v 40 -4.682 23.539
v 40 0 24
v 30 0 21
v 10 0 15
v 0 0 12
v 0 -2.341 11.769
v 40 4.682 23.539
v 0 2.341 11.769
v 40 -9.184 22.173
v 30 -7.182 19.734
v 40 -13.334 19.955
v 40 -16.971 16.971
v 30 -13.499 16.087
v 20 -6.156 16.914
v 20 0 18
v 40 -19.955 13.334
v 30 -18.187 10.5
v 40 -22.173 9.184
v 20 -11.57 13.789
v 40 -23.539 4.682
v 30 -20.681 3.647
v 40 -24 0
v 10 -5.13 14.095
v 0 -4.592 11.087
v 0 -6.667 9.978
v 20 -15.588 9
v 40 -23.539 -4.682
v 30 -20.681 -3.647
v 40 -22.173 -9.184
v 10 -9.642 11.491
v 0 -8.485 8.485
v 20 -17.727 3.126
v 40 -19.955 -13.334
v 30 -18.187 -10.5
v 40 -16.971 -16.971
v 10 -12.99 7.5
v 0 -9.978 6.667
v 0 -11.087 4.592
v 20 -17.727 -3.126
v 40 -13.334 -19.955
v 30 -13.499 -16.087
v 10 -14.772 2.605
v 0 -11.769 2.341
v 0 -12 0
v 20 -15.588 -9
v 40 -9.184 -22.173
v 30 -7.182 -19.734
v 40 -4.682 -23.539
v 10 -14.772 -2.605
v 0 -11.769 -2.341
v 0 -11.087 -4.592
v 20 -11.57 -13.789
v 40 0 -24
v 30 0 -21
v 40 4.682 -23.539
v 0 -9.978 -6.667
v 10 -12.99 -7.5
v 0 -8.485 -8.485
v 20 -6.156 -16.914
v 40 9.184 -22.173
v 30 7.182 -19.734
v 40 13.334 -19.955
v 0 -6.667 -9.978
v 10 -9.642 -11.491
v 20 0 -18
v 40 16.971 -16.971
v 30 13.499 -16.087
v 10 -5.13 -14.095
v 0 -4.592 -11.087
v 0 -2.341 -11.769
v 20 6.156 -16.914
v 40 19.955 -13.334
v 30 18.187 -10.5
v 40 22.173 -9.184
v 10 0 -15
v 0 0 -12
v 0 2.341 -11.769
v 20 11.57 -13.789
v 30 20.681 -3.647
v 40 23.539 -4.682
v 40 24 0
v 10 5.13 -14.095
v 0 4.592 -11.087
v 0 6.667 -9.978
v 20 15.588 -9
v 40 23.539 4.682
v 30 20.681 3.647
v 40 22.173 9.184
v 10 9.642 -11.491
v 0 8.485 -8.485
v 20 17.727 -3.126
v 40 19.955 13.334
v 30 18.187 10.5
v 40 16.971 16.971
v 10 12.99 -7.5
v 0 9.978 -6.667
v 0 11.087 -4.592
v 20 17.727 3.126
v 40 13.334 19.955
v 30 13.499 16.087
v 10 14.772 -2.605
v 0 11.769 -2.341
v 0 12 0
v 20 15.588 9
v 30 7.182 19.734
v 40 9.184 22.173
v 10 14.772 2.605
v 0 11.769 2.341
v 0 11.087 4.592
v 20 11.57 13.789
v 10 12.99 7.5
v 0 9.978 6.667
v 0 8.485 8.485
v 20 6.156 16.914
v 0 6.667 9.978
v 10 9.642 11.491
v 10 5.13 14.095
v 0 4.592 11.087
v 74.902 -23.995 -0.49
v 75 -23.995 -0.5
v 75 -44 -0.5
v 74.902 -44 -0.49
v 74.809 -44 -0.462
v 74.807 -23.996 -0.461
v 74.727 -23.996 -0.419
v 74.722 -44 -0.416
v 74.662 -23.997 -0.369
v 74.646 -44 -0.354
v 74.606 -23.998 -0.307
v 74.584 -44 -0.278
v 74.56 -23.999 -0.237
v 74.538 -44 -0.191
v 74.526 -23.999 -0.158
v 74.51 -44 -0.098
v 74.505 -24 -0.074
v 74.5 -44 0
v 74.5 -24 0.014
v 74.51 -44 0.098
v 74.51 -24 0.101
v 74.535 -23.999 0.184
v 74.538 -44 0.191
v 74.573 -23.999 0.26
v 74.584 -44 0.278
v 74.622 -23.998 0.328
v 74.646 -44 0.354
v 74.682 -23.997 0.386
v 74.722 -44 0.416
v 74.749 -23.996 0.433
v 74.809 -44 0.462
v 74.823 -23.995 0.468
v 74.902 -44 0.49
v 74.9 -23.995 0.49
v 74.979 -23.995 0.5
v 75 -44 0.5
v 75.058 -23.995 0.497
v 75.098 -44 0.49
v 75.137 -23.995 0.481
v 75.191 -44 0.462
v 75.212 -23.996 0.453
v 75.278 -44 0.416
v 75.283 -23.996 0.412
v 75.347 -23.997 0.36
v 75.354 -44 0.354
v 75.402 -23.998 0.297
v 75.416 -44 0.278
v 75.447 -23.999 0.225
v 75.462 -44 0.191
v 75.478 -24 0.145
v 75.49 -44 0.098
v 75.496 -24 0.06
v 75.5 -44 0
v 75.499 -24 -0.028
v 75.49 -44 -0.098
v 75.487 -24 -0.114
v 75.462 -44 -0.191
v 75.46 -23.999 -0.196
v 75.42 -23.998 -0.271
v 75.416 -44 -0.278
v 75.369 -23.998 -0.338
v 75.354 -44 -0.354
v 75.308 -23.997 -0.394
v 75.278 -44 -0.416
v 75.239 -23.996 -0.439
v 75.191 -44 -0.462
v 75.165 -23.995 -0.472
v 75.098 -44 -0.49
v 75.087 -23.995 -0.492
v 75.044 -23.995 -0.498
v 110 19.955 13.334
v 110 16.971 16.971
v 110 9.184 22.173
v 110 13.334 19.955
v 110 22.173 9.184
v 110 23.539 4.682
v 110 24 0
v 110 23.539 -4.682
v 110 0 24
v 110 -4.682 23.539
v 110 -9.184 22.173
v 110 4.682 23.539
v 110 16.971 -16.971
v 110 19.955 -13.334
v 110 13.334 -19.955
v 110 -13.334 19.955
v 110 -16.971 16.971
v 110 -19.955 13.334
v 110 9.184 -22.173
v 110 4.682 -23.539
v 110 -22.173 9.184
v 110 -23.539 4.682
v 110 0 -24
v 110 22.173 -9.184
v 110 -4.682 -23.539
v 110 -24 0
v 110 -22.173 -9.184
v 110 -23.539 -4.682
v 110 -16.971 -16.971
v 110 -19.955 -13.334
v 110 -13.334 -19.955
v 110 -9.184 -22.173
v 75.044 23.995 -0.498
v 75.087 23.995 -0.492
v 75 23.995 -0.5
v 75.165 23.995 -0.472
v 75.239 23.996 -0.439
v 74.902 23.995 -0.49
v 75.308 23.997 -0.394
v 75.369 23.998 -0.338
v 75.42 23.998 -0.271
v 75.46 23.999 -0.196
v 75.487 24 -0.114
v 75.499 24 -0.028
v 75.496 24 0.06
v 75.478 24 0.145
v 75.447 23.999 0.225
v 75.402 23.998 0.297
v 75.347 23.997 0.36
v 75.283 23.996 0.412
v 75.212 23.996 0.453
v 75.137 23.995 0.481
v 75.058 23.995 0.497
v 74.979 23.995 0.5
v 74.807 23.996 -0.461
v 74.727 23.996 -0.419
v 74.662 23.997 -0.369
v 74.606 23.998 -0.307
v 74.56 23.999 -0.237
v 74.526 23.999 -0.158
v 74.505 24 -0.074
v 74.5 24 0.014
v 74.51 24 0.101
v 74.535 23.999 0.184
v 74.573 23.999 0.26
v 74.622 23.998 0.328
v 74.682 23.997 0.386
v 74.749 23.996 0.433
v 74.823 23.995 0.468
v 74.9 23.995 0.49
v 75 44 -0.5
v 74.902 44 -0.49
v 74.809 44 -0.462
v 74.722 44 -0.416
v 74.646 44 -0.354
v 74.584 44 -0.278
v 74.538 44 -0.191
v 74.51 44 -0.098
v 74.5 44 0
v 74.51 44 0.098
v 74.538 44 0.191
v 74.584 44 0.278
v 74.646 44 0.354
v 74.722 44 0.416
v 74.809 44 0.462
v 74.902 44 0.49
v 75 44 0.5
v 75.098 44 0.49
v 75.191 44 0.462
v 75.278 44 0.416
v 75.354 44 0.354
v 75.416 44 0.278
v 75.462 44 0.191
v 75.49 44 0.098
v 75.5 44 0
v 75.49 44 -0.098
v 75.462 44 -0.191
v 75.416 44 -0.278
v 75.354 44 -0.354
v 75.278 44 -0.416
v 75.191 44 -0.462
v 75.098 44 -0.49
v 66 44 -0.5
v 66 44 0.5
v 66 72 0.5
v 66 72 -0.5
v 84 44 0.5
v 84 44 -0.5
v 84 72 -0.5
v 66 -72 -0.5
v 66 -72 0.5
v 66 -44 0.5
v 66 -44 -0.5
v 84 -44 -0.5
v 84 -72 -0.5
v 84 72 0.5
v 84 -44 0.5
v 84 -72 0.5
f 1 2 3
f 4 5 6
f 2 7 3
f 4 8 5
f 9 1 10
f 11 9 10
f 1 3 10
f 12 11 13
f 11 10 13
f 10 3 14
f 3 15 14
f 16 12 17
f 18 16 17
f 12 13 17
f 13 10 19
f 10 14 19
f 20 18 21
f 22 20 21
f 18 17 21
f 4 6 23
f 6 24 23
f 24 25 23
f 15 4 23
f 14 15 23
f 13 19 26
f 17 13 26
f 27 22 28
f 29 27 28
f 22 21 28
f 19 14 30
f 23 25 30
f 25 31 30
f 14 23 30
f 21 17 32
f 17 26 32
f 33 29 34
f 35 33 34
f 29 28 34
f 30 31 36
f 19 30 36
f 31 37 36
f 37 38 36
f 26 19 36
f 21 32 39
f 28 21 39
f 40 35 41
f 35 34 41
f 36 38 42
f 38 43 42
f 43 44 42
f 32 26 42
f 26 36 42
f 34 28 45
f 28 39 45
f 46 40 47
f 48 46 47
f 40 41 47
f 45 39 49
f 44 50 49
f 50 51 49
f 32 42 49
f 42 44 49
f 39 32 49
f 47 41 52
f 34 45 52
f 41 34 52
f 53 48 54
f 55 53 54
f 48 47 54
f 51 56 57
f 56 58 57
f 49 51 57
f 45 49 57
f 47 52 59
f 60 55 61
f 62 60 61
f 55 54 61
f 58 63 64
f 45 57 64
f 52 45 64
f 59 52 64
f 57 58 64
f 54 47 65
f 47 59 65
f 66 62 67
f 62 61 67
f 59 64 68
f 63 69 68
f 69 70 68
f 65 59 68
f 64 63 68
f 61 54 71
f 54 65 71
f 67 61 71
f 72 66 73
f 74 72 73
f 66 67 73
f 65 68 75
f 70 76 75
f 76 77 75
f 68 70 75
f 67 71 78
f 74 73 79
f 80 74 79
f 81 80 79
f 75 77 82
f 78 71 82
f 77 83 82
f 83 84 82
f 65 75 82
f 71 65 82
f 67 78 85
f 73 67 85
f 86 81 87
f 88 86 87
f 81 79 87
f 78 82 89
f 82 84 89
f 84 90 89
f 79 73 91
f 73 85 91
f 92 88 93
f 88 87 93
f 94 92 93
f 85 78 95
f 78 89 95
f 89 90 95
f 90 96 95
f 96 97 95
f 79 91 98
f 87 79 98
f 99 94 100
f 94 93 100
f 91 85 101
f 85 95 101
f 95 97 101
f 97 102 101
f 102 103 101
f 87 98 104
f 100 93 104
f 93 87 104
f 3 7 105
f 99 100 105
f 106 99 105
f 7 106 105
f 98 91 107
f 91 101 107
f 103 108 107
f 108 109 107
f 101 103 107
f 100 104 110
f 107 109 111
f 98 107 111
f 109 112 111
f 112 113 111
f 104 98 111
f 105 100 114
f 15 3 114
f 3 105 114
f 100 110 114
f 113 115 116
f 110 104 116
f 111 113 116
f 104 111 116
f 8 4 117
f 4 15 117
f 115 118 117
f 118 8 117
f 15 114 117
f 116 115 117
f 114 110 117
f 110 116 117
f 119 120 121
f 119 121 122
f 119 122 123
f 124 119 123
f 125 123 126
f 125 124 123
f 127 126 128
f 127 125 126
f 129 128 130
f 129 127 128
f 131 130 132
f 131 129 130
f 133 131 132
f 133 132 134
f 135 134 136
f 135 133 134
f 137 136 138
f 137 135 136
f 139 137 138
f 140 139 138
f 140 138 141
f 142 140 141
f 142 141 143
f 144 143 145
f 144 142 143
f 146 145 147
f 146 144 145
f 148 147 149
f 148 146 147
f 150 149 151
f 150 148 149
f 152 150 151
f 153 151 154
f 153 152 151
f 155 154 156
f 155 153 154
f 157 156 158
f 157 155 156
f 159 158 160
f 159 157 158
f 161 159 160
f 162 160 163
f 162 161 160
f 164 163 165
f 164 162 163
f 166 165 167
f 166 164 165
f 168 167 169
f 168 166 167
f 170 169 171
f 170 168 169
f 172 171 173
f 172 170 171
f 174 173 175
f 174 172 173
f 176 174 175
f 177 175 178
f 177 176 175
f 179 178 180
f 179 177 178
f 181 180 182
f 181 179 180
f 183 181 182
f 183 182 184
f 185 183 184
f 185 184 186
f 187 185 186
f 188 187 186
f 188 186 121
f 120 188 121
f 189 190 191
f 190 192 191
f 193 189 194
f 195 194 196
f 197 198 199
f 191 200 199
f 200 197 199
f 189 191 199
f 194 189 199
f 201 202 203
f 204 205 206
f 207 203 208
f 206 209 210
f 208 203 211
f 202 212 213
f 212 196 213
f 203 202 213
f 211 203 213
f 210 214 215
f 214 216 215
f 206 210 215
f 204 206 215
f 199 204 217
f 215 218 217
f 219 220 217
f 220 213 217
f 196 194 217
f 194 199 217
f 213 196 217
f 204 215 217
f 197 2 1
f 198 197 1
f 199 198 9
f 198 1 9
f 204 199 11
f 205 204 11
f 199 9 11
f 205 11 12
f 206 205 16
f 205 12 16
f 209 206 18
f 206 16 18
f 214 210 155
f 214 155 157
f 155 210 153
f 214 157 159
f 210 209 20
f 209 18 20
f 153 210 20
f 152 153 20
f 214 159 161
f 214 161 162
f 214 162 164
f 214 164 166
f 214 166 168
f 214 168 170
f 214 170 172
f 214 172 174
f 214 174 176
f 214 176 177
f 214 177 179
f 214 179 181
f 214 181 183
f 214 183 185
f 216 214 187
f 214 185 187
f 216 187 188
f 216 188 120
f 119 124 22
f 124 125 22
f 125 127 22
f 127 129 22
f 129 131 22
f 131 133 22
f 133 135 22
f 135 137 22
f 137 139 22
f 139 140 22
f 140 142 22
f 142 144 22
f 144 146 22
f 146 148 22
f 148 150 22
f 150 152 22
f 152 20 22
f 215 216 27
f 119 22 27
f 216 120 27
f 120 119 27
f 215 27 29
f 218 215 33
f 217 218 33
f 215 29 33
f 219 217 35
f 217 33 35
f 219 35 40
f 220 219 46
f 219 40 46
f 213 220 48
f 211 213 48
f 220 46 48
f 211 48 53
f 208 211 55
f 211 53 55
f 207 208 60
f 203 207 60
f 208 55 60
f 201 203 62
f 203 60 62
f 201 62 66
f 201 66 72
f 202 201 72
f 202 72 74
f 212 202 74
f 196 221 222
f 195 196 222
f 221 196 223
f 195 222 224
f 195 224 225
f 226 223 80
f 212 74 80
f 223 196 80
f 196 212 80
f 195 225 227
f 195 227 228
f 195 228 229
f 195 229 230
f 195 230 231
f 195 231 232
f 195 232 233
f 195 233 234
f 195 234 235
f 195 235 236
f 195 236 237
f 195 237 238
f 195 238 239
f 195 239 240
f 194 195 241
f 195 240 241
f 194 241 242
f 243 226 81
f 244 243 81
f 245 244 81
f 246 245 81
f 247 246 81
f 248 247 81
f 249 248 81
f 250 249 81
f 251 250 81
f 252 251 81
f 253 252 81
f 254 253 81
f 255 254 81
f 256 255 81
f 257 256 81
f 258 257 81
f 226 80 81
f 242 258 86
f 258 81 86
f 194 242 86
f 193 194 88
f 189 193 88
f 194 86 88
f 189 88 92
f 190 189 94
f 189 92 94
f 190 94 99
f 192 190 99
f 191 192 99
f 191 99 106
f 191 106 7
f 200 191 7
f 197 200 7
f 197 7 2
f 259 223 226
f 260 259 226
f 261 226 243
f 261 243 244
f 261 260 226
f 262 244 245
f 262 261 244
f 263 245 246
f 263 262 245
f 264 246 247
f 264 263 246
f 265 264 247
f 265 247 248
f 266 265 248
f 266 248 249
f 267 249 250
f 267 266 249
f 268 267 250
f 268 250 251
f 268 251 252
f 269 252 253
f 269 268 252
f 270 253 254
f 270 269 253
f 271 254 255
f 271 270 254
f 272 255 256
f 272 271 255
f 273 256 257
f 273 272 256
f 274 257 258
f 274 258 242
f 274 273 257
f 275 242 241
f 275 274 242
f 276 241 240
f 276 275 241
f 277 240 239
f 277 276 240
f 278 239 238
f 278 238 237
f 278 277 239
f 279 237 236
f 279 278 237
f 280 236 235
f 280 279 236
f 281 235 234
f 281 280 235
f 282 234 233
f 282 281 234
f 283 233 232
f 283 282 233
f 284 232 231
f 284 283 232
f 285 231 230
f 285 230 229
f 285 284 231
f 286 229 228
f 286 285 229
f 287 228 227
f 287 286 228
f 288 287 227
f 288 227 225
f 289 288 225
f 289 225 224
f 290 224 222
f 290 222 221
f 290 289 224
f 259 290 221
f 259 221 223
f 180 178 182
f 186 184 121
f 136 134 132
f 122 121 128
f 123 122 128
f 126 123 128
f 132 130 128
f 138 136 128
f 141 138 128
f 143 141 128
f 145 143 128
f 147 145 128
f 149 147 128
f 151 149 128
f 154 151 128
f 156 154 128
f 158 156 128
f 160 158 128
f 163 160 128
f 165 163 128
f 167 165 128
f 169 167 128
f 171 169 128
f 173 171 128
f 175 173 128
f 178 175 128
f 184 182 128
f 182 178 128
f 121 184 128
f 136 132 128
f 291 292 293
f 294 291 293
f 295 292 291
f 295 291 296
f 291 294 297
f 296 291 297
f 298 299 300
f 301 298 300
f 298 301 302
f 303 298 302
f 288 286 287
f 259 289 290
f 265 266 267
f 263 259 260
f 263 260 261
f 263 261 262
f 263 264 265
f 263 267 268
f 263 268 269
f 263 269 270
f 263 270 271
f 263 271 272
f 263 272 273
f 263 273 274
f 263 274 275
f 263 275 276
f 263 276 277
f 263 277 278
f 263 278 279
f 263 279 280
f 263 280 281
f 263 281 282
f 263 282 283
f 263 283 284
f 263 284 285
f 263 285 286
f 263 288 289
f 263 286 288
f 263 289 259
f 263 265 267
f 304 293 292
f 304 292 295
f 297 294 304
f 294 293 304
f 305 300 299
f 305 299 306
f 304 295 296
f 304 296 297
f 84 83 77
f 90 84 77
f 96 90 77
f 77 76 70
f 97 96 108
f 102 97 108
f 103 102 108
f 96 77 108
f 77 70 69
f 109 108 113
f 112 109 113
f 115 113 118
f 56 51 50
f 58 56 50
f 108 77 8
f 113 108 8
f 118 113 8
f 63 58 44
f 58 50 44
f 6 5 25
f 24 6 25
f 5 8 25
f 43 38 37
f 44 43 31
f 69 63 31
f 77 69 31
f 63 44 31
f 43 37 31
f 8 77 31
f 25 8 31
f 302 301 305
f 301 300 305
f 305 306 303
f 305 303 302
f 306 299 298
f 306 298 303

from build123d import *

# Parameters (mm, degrees)
SKETCH2_R        = 0.5
EXTRUDE1_DEPTH   = 44
SKETCH3_W        = 18
SKETCH3_H        = 28
EXTRUDE2_DEPTH   = 0.5
EXTRUDE2_2_DEPTH = 0.5


with BuildPart() as part:
    # Sketch1 → Revolve1 (revolve)
    with BuildSketch(Plane.XY, mode=Mode.PRIVATE) as revolve1_sk:
        Polygon((0, 0), (110, 0), (110, 24), (40, 24), (0, 12), align=None)
    revolve(revolve1_sk.sketch.rotate(Axis((0, 0, 0), (1, 0, 0)), 90), axis=Axis((0, 0, 0), (1, 0, 0)))  # turned: the seam where the file's is

    # Sketch2 → Extrude1 (add, symmetric)
    with BuildSketch(Plane(origin=(0, 0, 0), x_dir=(1, 0, 0), z_dir=(0, 1, 0))):
        with Locations(Location((75, 0, 0), (0, 0, 90))):  # turned: the seam where the file's is
            Circle(SKETCH2_R)
    extrude(amount=EXTRUDE1_DEPTH, both=True)


with BuildPart() as body_2:
    # Sketch3 → Extrude2 (new body, symmetric)
    with BuildSketch(Plane.XY):
        with Locations((75, 58)):
            Rectangle(SKETCH3_W, SKETCH3_H)
    extrude(amount=EXTRUDE2_DEPTH, both=True)


with BuildPart() as body_3:
    # Sketch3 → Extrude2 2 (new body, symmetric)
    with BuildSketch(Plane.XY):
        with Locations((75, -58)):
            Rectangle(SKETCH3_W, SKETCH3_H)
    extrude(amount=EXTRUDE2_2_DEPTH, both=True)


solid = Compound([part.part, body_2.part, body_3.part])
